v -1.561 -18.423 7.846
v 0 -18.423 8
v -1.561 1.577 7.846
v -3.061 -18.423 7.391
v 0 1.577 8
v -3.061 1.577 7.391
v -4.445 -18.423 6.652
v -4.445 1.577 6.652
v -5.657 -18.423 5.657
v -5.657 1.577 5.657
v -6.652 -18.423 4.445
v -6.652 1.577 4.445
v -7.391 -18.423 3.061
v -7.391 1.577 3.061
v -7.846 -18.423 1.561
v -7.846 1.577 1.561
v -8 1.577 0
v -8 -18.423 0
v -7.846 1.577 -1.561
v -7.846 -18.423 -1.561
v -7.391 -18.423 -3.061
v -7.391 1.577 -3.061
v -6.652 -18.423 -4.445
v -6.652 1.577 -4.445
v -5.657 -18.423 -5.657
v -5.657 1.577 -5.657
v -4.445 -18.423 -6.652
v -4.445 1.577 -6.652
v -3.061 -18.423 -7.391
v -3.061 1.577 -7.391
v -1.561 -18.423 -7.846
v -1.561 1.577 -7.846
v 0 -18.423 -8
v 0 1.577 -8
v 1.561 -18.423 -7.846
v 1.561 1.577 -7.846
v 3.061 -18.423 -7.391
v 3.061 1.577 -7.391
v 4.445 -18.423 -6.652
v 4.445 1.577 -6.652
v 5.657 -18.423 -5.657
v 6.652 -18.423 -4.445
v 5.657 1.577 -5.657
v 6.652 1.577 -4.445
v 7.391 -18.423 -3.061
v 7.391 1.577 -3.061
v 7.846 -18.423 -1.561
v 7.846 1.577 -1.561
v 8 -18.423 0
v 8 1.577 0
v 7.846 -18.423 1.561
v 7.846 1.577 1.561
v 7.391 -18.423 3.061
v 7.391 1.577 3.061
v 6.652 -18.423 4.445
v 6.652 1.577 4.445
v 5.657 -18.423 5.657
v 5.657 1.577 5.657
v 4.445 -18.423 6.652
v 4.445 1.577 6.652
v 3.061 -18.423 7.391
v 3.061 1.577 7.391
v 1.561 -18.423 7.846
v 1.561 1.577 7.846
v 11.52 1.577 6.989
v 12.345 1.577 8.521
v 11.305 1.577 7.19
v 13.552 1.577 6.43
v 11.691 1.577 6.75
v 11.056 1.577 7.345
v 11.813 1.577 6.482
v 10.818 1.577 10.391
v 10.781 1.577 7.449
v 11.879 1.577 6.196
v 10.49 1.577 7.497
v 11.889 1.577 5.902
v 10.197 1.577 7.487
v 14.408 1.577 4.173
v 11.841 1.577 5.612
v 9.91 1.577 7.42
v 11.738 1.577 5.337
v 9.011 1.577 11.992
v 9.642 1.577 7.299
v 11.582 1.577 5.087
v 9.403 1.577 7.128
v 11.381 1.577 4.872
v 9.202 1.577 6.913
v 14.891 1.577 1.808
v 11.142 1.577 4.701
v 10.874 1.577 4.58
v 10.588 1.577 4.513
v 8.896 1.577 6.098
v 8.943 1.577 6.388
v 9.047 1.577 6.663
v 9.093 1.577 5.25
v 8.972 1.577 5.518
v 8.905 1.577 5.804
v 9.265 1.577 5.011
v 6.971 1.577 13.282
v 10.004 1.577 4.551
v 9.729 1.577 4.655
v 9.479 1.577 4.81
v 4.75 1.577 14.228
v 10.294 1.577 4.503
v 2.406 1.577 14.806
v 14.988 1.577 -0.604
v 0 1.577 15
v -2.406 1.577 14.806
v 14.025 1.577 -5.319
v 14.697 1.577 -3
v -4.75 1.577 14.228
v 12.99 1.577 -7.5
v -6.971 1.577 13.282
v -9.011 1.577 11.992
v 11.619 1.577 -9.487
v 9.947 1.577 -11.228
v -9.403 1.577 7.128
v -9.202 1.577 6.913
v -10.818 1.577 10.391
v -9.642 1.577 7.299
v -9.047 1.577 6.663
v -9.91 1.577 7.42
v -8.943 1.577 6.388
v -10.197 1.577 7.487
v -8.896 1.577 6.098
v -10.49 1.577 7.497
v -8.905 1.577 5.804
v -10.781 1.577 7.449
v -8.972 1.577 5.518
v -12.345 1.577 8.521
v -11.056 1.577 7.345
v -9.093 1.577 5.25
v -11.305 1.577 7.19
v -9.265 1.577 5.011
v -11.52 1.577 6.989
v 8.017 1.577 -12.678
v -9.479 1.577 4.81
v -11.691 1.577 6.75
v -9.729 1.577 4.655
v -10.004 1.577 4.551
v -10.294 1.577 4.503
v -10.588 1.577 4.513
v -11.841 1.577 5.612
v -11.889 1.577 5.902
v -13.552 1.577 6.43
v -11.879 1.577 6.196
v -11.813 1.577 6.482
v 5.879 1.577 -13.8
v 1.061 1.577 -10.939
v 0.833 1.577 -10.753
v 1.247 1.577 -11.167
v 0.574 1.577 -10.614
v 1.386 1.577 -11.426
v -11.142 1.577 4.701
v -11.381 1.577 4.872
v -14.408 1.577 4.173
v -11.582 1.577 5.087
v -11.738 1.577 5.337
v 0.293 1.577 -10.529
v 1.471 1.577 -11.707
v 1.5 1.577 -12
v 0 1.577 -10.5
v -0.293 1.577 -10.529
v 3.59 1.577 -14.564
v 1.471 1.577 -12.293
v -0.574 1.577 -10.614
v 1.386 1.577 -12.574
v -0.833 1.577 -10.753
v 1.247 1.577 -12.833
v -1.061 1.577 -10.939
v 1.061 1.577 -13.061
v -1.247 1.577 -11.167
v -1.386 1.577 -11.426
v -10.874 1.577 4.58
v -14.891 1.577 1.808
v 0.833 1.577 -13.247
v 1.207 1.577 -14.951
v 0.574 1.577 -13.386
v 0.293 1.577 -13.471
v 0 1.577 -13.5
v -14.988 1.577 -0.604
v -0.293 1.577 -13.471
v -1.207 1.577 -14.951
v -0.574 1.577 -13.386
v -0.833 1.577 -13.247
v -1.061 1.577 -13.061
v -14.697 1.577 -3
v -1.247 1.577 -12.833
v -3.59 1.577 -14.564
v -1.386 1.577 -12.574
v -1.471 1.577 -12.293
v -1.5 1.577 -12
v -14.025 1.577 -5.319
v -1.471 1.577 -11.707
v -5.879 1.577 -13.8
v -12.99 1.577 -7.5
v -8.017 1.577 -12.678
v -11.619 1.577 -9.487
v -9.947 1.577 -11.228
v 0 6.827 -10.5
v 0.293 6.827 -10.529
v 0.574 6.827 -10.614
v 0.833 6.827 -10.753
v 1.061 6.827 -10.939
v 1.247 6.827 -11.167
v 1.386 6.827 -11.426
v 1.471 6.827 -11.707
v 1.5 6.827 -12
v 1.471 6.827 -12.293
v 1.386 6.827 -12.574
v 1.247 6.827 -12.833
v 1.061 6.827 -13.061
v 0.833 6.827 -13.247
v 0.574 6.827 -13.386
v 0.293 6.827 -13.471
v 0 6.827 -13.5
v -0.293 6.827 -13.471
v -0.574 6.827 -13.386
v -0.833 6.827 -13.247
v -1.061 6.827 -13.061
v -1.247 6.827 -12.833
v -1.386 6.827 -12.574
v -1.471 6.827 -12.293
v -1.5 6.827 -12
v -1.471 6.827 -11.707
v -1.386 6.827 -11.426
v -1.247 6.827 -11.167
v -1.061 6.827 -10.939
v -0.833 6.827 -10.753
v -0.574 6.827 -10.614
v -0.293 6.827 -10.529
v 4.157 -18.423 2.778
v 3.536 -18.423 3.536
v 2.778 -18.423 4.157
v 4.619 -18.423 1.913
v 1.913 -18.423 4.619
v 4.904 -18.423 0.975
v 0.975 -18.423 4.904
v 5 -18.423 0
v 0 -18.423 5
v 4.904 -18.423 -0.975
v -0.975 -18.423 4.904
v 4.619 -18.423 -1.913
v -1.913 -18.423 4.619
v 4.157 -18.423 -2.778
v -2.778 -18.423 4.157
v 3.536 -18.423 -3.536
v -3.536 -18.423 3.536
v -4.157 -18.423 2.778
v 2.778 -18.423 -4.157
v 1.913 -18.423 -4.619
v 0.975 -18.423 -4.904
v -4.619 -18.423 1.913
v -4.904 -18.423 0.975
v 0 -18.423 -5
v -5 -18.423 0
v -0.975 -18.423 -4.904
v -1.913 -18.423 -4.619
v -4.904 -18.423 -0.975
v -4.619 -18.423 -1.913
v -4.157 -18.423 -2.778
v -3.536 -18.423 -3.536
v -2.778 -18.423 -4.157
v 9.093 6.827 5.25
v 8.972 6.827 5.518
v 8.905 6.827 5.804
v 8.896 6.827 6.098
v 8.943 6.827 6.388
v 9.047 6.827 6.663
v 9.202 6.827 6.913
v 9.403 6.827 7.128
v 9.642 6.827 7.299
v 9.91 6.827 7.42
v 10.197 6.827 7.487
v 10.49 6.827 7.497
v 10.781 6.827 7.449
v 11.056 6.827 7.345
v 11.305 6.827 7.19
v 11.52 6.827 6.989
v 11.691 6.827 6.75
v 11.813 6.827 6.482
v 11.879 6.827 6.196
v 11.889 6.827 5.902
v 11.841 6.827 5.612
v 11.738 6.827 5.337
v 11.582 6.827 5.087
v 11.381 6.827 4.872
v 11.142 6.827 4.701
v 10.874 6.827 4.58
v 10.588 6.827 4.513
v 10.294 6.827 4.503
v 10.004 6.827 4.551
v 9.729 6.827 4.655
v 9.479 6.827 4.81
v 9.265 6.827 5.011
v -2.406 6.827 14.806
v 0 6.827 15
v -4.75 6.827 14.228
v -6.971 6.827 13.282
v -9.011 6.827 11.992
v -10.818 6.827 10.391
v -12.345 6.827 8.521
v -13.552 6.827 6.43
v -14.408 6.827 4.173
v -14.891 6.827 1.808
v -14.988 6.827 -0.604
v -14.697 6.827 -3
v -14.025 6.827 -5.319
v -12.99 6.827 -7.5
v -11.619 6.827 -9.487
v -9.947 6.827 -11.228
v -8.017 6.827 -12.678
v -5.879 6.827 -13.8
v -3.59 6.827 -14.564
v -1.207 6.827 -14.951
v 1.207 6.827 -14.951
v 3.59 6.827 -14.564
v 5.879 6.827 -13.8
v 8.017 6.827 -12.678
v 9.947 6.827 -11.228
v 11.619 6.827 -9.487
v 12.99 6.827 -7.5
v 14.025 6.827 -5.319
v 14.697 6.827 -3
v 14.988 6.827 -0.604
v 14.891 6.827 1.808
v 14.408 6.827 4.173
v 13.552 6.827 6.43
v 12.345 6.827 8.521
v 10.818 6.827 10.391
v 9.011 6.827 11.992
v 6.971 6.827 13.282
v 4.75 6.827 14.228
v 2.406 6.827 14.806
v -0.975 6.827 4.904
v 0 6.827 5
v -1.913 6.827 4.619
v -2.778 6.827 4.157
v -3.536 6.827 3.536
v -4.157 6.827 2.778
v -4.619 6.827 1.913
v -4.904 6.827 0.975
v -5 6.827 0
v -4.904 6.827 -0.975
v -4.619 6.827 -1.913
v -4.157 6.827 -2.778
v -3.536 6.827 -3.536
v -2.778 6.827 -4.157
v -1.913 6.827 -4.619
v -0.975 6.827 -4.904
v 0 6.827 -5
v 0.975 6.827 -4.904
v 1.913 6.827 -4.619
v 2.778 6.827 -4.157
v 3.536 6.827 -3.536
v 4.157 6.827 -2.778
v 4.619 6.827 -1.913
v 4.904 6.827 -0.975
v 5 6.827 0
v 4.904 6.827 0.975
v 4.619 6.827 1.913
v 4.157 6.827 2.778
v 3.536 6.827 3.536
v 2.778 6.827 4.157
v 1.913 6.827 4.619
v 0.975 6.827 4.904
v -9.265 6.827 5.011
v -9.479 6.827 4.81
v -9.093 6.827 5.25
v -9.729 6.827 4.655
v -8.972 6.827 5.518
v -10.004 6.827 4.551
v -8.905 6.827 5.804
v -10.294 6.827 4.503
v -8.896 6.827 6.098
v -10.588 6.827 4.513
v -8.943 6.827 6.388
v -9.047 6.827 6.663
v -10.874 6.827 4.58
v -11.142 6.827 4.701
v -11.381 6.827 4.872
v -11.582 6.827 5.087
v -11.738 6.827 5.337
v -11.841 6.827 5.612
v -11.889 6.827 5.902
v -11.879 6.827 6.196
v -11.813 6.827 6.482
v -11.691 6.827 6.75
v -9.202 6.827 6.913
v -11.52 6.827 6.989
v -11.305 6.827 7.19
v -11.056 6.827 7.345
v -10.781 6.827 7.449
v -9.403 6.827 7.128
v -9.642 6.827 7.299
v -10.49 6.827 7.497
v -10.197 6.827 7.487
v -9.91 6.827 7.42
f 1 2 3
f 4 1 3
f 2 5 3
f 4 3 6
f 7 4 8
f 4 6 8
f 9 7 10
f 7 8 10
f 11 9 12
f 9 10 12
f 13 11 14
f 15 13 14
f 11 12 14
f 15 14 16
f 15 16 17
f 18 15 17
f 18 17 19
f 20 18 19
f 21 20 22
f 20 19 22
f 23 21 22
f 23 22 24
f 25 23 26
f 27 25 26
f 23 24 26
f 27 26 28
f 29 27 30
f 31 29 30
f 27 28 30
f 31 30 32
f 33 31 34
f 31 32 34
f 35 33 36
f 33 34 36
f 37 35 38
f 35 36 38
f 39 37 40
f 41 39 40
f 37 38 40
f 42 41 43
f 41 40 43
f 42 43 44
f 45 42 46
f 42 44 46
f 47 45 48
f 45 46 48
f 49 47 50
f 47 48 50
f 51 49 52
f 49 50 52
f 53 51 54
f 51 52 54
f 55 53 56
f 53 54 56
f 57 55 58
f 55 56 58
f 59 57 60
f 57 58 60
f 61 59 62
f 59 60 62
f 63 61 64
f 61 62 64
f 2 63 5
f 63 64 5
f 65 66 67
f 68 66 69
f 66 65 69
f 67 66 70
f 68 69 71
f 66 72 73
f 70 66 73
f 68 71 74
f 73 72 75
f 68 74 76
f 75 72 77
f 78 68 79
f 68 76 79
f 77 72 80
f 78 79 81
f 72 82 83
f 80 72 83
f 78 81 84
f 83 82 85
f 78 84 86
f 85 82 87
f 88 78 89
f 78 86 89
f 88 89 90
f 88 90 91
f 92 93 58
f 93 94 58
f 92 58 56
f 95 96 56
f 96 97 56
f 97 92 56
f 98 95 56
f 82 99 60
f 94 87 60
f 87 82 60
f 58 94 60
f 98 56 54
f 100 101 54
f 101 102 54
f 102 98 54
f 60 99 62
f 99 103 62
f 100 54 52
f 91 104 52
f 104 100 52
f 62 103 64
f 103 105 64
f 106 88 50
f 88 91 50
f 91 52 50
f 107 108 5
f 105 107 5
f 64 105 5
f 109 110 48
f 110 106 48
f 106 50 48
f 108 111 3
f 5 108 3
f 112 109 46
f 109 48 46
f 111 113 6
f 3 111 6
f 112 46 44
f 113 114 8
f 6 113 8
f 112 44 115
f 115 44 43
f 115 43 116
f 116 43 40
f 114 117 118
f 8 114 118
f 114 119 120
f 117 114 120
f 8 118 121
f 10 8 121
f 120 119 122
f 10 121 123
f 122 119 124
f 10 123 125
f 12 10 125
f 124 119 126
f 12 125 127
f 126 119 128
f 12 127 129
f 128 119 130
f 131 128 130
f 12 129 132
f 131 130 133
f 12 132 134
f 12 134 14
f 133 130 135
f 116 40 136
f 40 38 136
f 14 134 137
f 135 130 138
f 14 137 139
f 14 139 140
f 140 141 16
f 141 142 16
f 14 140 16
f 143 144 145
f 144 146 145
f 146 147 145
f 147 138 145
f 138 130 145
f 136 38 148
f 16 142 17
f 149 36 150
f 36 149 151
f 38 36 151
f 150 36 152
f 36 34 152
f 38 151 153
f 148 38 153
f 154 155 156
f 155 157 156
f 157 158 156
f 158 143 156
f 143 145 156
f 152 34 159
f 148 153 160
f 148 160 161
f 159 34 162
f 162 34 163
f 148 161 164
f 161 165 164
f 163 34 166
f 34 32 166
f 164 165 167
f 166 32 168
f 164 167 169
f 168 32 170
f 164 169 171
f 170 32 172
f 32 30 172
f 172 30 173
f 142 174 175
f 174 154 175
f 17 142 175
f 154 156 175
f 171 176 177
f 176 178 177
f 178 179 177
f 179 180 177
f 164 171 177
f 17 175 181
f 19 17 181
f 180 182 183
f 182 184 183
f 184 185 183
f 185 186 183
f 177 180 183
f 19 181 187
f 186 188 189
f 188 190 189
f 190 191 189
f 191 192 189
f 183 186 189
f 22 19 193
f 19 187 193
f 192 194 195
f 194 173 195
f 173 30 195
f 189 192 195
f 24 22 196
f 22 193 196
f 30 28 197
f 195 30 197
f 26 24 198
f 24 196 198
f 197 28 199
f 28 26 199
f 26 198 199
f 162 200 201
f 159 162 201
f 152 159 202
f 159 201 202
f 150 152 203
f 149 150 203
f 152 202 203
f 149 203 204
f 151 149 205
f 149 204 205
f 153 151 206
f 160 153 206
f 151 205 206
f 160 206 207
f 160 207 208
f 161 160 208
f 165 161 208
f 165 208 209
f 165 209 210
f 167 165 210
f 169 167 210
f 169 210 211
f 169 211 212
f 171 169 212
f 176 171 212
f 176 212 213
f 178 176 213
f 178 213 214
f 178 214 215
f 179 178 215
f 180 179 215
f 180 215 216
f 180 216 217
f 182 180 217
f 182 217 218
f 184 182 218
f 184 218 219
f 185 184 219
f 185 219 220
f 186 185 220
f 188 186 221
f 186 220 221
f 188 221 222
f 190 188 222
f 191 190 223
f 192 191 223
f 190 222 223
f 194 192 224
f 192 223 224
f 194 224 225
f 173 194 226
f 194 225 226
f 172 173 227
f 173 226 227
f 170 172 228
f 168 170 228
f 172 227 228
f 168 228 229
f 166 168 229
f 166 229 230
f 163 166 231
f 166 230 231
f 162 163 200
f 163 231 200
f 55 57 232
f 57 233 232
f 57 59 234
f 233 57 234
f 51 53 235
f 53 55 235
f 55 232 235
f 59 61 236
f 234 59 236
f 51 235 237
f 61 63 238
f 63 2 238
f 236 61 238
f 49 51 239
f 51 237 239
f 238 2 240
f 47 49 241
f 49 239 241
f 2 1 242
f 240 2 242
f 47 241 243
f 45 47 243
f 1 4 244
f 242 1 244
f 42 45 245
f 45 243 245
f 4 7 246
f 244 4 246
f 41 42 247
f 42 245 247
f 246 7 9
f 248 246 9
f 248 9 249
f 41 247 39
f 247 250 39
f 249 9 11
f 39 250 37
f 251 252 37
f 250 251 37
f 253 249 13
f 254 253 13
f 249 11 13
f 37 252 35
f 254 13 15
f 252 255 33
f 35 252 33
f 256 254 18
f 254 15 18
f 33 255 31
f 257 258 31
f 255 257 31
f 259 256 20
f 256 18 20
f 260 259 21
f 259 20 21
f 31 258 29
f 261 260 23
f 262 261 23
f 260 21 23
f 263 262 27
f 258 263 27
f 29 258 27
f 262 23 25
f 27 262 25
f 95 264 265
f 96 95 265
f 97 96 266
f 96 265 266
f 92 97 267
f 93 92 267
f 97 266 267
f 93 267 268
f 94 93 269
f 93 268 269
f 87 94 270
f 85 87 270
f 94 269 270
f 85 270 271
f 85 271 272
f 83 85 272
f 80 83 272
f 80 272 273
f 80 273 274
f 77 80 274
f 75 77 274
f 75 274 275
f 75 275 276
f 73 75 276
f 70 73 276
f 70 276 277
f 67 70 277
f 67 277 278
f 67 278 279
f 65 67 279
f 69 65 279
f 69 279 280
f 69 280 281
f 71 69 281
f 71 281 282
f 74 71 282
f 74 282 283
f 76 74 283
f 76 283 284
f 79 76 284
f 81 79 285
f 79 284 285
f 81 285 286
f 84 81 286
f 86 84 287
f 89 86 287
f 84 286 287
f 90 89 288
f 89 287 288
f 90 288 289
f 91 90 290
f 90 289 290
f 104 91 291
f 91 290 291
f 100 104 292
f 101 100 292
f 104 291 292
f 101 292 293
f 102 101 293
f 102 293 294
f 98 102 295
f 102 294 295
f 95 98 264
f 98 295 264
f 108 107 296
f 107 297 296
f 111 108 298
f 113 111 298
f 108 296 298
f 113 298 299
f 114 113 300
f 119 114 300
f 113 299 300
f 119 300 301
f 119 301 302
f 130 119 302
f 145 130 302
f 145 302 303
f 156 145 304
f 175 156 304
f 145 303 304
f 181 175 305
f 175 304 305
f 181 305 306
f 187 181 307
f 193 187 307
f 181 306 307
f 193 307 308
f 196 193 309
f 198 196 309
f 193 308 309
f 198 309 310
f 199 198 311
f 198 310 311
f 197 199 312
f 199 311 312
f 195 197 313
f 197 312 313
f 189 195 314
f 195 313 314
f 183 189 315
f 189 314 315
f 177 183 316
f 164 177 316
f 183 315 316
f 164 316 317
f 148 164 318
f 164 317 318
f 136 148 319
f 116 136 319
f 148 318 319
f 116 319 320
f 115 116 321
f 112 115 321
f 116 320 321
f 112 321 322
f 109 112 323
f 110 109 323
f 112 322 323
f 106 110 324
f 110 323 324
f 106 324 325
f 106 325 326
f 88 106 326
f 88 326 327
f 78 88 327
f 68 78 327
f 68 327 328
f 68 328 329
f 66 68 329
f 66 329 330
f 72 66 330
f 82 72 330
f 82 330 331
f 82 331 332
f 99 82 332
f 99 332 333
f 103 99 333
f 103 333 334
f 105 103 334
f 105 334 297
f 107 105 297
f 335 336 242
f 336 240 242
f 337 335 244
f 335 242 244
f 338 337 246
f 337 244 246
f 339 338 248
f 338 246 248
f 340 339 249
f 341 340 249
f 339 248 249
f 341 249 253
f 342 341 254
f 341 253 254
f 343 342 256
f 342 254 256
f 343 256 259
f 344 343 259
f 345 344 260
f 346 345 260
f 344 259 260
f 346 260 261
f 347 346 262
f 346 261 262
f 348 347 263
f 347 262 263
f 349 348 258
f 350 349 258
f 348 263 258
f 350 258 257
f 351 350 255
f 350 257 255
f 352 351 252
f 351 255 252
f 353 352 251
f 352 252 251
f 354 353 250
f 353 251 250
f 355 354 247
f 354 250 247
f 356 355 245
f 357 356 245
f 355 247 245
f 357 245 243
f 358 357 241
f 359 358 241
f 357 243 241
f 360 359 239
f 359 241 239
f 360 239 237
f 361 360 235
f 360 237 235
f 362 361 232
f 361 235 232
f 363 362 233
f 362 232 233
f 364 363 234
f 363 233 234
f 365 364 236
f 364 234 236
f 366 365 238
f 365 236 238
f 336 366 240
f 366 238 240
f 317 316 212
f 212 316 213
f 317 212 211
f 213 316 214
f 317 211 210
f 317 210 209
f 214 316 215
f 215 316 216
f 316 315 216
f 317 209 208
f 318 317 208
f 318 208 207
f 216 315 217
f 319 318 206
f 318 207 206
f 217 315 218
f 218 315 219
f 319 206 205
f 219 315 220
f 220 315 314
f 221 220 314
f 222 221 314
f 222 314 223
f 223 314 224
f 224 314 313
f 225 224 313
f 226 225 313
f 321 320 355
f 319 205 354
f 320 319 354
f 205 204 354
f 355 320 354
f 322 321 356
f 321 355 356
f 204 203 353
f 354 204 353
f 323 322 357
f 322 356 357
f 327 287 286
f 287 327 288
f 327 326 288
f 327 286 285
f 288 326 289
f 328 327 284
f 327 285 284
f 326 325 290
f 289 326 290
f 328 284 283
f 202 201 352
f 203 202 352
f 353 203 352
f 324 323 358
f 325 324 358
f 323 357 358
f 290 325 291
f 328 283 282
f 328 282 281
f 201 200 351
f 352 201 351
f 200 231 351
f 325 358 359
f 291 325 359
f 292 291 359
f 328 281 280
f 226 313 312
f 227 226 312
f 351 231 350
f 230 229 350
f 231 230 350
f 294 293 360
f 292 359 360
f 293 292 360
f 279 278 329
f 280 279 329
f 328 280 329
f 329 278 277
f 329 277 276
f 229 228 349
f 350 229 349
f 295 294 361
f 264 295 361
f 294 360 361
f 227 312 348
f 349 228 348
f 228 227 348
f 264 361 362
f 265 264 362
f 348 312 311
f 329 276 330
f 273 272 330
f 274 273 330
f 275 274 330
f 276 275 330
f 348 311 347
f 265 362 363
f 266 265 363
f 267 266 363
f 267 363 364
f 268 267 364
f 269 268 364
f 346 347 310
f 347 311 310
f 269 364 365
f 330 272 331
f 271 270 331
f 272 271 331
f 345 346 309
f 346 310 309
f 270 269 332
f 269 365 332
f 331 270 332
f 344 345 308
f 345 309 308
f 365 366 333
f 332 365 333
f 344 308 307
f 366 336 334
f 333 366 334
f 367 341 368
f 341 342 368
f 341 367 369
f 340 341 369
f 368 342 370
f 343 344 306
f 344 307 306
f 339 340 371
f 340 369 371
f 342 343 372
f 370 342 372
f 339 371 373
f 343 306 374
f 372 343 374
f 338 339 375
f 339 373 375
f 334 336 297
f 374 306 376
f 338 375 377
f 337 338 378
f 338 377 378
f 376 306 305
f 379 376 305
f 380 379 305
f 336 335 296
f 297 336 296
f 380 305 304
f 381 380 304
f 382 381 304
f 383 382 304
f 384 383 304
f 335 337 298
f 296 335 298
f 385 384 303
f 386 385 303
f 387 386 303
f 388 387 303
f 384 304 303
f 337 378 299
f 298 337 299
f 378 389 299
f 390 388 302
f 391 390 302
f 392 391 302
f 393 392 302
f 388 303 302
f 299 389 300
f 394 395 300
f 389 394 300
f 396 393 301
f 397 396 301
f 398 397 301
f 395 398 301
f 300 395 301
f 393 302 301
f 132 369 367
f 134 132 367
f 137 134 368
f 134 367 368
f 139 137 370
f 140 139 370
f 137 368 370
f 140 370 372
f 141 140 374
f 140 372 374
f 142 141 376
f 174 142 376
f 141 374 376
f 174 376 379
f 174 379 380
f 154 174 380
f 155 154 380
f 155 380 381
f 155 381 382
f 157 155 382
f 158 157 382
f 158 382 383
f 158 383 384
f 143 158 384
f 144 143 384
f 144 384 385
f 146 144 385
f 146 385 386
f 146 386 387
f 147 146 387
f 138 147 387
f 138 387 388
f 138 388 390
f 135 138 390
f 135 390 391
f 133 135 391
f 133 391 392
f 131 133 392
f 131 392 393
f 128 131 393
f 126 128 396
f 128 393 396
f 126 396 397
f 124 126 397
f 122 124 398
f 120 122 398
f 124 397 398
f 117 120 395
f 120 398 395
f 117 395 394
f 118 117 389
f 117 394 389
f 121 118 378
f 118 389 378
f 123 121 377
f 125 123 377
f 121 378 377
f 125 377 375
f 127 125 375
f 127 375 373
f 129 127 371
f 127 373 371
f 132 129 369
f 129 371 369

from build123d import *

# Parameters (mm, degrees)
SKETCH2_R          = 1.5
CUT_EXTRUDE1_DEPTH = 10
CIRPATTERN1_COUNT  = 3


with BuildPart() as part:
    # Sketch1 → Revolve1 (revolve)
    with BuildSketch(Plane.XY, mode=Mode.PRIVATE) as revolve1_sk:
        Polygon((-5, 6.826923077), (-5, -18.423076923), (-8, -18.423076923), (-8, 1.576923077), (-15, 1.576923077), (-15, 6.826923077), align=None)
    revolve(revolve1_sk.sketch.rotate(Axis((0, 6, 0), (0, -1, 0)), 270), axis=Axis((0, 6, 0), (0, -1, 0)))

    # Sketch2 → Cut-Extrude1 (cut)
    with BuildSketch(Plane(origin=(0, 6.826923077, 0), x_dir=(1, 0, 0), z_dir=(0, 1, 0))):
        with Locations(Location((0, 12, 0), (0, 0, 270))):
            Circle(SKETCH2_R)
    cut_extrude1 = extrude(amount=-CUT_EXTRUDE1_DEPTH, mode=Mode.SUBTRACT)

    # CirPattern1: Cut-Extrude1 ×3 about axis
    cirpattern1_axis = Axis((0, 0, 0), (0, 1, 0))
    for i in range(1, CIRPATTERN1_COUNT):
        add(cut_extrude1.rotate(cirpattern1_axis, i * 360 / CIRPATTERN1_COUNT), mode=Mode.SUBTRACT)


solid = part.part
